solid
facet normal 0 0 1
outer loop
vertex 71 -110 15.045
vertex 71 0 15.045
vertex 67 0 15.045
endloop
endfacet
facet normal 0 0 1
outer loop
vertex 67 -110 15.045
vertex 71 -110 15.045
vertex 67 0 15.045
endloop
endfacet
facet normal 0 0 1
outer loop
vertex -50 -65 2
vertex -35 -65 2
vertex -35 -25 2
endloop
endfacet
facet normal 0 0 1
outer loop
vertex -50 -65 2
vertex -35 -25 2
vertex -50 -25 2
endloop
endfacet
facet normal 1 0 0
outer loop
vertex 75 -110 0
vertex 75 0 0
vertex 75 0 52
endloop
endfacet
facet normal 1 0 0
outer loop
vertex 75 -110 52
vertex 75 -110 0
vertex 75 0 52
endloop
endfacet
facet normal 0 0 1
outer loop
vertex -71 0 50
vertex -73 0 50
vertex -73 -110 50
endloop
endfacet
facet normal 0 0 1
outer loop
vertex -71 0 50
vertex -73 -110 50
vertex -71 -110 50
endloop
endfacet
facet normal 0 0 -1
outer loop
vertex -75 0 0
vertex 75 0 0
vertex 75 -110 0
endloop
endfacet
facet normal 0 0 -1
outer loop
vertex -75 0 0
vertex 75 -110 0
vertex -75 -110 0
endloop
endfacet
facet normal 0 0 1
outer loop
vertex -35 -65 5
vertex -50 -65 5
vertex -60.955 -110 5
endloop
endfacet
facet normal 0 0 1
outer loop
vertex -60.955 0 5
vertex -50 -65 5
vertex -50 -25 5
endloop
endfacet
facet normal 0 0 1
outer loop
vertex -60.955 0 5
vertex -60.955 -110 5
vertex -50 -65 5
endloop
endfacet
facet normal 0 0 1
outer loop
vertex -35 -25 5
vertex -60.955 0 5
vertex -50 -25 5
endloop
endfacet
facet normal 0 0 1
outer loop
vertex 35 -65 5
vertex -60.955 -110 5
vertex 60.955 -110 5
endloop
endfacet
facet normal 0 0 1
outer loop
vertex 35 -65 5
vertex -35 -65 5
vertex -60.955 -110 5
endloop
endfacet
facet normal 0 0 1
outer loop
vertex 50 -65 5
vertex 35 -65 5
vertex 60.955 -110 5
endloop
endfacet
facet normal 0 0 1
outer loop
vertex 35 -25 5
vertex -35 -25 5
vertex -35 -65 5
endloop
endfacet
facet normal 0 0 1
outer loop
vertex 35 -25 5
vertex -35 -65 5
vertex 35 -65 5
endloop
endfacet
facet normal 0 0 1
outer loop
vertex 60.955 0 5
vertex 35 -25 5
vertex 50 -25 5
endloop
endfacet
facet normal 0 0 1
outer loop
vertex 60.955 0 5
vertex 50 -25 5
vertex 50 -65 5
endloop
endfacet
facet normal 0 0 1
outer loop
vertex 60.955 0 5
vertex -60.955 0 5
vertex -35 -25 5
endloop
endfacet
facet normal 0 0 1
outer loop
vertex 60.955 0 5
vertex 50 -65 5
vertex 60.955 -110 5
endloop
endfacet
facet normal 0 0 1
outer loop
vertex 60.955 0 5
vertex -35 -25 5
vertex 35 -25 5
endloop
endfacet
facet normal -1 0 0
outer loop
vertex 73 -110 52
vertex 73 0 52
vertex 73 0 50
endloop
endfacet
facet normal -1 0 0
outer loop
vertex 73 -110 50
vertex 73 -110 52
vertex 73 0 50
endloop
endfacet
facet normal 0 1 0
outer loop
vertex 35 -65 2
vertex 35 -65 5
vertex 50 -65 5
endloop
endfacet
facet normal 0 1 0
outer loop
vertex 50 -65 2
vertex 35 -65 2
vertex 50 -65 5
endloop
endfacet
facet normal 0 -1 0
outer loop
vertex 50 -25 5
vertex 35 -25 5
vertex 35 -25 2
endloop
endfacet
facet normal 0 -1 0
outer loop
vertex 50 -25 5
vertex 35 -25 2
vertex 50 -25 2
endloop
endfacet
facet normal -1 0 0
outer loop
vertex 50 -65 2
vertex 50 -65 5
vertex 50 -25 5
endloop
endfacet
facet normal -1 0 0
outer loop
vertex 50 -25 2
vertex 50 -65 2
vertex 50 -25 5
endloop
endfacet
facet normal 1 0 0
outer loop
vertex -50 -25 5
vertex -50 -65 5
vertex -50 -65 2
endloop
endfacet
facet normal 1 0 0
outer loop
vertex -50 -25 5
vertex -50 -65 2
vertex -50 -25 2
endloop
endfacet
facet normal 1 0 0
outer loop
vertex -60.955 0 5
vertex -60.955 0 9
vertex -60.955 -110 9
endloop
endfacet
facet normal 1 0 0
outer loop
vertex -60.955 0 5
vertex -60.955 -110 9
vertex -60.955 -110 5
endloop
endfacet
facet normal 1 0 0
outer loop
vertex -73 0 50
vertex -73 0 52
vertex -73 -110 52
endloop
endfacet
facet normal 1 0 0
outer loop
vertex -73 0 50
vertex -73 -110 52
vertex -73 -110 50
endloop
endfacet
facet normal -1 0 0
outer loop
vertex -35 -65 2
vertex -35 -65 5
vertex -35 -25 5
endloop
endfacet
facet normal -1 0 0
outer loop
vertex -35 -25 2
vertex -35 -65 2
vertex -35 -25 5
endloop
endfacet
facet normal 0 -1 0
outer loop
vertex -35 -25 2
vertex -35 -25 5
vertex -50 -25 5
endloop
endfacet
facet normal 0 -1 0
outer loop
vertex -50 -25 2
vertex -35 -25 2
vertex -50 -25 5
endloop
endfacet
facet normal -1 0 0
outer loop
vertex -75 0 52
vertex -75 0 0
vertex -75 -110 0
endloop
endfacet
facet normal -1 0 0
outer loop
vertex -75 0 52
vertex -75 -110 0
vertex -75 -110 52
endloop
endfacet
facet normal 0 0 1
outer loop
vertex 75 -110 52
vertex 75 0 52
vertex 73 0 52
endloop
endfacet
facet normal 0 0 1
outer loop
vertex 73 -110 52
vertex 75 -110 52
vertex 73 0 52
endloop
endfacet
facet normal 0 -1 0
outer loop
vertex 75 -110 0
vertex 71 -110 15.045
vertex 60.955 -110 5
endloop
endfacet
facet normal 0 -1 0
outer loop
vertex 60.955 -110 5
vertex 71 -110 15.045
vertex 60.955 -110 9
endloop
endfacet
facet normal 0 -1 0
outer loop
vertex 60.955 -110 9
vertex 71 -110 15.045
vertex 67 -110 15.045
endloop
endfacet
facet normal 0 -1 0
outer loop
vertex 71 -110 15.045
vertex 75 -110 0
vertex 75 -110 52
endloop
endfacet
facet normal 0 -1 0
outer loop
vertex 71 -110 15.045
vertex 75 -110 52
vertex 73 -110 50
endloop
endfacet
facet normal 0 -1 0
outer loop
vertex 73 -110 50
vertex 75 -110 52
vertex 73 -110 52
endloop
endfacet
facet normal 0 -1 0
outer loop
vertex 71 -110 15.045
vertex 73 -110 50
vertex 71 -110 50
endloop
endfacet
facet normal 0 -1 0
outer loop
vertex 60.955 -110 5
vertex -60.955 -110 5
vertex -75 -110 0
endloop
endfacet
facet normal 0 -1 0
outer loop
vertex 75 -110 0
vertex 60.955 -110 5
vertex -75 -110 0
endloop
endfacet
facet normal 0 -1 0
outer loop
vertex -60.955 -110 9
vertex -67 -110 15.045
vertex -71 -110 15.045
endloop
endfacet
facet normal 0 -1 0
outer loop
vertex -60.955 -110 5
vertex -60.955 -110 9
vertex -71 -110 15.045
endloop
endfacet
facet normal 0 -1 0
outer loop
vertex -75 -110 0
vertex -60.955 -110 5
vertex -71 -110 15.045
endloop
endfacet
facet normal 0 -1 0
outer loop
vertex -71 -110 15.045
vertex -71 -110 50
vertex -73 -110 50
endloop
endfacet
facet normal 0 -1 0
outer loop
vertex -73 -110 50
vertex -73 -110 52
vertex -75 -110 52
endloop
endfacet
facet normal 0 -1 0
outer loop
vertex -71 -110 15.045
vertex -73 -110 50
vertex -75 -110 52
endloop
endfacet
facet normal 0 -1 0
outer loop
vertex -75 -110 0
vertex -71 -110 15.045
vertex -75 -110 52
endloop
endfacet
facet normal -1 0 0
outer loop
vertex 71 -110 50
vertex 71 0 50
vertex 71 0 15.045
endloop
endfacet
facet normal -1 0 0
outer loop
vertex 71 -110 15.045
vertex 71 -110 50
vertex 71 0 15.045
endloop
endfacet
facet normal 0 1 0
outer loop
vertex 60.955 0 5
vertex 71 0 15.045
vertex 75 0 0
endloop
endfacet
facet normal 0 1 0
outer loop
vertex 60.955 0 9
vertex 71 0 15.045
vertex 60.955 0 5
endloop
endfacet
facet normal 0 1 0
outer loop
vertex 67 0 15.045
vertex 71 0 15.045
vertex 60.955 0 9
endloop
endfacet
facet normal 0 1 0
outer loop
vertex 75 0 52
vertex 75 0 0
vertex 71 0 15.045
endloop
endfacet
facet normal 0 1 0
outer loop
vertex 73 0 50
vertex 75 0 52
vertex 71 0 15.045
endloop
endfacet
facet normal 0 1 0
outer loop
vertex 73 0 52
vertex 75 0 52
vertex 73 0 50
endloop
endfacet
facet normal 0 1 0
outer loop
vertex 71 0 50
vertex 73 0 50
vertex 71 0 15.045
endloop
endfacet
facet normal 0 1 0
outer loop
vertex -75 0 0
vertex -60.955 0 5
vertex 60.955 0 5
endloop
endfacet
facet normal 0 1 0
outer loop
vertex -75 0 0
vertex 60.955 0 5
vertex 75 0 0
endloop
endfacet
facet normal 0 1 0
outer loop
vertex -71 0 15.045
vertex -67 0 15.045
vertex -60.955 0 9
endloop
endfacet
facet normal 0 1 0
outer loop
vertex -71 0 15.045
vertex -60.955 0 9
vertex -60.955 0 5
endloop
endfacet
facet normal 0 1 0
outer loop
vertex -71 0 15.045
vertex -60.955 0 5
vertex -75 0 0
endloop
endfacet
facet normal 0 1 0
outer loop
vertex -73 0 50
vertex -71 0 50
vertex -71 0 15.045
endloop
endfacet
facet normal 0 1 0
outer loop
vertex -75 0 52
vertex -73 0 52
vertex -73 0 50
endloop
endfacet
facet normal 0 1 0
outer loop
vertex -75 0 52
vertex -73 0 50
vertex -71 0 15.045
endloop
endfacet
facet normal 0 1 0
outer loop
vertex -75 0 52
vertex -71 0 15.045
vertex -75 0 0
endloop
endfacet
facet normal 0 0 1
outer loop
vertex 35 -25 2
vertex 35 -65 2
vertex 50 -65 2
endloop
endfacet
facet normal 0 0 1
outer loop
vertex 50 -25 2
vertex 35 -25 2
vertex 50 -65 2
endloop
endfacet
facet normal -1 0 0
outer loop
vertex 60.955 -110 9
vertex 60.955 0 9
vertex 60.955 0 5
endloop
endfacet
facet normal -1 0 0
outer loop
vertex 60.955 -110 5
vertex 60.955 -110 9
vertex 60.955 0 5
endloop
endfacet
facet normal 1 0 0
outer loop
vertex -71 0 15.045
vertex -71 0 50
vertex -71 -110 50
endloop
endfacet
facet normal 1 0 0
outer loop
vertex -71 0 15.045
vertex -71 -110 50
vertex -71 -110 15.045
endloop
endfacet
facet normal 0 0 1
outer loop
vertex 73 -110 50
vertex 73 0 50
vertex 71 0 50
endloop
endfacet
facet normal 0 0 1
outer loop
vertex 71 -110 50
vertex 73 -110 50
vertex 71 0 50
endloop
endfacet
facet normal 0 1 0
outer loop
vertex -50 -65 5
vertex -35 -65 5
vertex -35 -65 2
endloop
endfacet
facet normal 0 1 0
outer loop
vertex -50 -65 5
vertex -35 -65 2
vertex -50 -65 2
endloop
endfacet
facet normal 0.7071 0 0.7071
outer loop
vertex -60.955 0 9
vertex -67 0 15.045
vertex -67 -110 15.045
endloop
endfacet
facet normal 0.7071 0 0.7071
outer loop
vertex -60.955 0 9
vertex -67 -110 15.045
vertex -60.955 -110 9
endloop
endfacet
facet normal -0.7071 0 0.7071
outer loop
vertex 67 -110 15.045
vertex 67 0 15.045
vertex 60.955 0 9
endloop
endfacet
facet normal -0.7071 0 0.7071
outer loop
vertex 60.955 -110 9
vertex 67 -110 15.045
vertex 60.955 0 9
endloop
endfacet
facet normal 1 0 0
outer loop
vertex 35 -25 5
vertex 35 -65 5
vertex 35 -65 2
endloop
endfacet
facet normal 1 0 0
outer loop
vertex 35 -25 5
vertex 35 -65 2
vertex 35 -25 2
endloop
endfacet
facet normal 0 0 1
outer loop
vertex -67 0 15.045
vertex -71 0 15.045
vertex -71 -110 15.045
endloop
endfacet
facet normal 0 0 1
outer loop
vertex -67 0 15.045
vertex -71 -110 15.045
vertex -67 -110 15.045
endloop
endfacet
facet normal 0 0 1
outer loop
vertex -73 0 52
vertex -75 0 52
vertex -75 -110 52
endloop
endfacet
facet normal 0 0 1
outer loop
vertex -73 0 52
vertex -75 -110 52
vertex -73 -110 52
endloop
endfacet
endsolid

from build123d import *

# Parameters (mm, degrees)
F1_DEPTH = 110
F2_W     = 15
F2_H     = 40
F3_DEPTH = 3


# Not quite as in the source:
# - a feature names something its author has since deleted; it is built from what else it names


with BuildPart() as f1:
    # F0 (on Front) → F1 (new body)
    with BuildSketch(Plane.XZ):
        Polygon((0, 5), (0, 0), (75, 0), (75, 52), (73, 52), (73, 50), (71, 50), (71, 15.0446529165), (67, 15.0446529165), (60.9553470835, 9), (60.9553470835, 5), align=None)
    extrude(amount=F1_DEPTH)

    # F2 (on face) → F3 (cut)
    with BuildSketch(Plane.XY.offset(5)):
        with Locations((42.5, -45)):
            Rectangle(F2_W, F2_H)
    extrude(amount=-F3_DEPTH, mode=Mode.SUBTRACT)

    # F4: F1 across plane


with BuildPart() as f1_1:
    add(f1.part)
    add(f1.part.mirror(Plane.YZ))


solid = f1_1.part
